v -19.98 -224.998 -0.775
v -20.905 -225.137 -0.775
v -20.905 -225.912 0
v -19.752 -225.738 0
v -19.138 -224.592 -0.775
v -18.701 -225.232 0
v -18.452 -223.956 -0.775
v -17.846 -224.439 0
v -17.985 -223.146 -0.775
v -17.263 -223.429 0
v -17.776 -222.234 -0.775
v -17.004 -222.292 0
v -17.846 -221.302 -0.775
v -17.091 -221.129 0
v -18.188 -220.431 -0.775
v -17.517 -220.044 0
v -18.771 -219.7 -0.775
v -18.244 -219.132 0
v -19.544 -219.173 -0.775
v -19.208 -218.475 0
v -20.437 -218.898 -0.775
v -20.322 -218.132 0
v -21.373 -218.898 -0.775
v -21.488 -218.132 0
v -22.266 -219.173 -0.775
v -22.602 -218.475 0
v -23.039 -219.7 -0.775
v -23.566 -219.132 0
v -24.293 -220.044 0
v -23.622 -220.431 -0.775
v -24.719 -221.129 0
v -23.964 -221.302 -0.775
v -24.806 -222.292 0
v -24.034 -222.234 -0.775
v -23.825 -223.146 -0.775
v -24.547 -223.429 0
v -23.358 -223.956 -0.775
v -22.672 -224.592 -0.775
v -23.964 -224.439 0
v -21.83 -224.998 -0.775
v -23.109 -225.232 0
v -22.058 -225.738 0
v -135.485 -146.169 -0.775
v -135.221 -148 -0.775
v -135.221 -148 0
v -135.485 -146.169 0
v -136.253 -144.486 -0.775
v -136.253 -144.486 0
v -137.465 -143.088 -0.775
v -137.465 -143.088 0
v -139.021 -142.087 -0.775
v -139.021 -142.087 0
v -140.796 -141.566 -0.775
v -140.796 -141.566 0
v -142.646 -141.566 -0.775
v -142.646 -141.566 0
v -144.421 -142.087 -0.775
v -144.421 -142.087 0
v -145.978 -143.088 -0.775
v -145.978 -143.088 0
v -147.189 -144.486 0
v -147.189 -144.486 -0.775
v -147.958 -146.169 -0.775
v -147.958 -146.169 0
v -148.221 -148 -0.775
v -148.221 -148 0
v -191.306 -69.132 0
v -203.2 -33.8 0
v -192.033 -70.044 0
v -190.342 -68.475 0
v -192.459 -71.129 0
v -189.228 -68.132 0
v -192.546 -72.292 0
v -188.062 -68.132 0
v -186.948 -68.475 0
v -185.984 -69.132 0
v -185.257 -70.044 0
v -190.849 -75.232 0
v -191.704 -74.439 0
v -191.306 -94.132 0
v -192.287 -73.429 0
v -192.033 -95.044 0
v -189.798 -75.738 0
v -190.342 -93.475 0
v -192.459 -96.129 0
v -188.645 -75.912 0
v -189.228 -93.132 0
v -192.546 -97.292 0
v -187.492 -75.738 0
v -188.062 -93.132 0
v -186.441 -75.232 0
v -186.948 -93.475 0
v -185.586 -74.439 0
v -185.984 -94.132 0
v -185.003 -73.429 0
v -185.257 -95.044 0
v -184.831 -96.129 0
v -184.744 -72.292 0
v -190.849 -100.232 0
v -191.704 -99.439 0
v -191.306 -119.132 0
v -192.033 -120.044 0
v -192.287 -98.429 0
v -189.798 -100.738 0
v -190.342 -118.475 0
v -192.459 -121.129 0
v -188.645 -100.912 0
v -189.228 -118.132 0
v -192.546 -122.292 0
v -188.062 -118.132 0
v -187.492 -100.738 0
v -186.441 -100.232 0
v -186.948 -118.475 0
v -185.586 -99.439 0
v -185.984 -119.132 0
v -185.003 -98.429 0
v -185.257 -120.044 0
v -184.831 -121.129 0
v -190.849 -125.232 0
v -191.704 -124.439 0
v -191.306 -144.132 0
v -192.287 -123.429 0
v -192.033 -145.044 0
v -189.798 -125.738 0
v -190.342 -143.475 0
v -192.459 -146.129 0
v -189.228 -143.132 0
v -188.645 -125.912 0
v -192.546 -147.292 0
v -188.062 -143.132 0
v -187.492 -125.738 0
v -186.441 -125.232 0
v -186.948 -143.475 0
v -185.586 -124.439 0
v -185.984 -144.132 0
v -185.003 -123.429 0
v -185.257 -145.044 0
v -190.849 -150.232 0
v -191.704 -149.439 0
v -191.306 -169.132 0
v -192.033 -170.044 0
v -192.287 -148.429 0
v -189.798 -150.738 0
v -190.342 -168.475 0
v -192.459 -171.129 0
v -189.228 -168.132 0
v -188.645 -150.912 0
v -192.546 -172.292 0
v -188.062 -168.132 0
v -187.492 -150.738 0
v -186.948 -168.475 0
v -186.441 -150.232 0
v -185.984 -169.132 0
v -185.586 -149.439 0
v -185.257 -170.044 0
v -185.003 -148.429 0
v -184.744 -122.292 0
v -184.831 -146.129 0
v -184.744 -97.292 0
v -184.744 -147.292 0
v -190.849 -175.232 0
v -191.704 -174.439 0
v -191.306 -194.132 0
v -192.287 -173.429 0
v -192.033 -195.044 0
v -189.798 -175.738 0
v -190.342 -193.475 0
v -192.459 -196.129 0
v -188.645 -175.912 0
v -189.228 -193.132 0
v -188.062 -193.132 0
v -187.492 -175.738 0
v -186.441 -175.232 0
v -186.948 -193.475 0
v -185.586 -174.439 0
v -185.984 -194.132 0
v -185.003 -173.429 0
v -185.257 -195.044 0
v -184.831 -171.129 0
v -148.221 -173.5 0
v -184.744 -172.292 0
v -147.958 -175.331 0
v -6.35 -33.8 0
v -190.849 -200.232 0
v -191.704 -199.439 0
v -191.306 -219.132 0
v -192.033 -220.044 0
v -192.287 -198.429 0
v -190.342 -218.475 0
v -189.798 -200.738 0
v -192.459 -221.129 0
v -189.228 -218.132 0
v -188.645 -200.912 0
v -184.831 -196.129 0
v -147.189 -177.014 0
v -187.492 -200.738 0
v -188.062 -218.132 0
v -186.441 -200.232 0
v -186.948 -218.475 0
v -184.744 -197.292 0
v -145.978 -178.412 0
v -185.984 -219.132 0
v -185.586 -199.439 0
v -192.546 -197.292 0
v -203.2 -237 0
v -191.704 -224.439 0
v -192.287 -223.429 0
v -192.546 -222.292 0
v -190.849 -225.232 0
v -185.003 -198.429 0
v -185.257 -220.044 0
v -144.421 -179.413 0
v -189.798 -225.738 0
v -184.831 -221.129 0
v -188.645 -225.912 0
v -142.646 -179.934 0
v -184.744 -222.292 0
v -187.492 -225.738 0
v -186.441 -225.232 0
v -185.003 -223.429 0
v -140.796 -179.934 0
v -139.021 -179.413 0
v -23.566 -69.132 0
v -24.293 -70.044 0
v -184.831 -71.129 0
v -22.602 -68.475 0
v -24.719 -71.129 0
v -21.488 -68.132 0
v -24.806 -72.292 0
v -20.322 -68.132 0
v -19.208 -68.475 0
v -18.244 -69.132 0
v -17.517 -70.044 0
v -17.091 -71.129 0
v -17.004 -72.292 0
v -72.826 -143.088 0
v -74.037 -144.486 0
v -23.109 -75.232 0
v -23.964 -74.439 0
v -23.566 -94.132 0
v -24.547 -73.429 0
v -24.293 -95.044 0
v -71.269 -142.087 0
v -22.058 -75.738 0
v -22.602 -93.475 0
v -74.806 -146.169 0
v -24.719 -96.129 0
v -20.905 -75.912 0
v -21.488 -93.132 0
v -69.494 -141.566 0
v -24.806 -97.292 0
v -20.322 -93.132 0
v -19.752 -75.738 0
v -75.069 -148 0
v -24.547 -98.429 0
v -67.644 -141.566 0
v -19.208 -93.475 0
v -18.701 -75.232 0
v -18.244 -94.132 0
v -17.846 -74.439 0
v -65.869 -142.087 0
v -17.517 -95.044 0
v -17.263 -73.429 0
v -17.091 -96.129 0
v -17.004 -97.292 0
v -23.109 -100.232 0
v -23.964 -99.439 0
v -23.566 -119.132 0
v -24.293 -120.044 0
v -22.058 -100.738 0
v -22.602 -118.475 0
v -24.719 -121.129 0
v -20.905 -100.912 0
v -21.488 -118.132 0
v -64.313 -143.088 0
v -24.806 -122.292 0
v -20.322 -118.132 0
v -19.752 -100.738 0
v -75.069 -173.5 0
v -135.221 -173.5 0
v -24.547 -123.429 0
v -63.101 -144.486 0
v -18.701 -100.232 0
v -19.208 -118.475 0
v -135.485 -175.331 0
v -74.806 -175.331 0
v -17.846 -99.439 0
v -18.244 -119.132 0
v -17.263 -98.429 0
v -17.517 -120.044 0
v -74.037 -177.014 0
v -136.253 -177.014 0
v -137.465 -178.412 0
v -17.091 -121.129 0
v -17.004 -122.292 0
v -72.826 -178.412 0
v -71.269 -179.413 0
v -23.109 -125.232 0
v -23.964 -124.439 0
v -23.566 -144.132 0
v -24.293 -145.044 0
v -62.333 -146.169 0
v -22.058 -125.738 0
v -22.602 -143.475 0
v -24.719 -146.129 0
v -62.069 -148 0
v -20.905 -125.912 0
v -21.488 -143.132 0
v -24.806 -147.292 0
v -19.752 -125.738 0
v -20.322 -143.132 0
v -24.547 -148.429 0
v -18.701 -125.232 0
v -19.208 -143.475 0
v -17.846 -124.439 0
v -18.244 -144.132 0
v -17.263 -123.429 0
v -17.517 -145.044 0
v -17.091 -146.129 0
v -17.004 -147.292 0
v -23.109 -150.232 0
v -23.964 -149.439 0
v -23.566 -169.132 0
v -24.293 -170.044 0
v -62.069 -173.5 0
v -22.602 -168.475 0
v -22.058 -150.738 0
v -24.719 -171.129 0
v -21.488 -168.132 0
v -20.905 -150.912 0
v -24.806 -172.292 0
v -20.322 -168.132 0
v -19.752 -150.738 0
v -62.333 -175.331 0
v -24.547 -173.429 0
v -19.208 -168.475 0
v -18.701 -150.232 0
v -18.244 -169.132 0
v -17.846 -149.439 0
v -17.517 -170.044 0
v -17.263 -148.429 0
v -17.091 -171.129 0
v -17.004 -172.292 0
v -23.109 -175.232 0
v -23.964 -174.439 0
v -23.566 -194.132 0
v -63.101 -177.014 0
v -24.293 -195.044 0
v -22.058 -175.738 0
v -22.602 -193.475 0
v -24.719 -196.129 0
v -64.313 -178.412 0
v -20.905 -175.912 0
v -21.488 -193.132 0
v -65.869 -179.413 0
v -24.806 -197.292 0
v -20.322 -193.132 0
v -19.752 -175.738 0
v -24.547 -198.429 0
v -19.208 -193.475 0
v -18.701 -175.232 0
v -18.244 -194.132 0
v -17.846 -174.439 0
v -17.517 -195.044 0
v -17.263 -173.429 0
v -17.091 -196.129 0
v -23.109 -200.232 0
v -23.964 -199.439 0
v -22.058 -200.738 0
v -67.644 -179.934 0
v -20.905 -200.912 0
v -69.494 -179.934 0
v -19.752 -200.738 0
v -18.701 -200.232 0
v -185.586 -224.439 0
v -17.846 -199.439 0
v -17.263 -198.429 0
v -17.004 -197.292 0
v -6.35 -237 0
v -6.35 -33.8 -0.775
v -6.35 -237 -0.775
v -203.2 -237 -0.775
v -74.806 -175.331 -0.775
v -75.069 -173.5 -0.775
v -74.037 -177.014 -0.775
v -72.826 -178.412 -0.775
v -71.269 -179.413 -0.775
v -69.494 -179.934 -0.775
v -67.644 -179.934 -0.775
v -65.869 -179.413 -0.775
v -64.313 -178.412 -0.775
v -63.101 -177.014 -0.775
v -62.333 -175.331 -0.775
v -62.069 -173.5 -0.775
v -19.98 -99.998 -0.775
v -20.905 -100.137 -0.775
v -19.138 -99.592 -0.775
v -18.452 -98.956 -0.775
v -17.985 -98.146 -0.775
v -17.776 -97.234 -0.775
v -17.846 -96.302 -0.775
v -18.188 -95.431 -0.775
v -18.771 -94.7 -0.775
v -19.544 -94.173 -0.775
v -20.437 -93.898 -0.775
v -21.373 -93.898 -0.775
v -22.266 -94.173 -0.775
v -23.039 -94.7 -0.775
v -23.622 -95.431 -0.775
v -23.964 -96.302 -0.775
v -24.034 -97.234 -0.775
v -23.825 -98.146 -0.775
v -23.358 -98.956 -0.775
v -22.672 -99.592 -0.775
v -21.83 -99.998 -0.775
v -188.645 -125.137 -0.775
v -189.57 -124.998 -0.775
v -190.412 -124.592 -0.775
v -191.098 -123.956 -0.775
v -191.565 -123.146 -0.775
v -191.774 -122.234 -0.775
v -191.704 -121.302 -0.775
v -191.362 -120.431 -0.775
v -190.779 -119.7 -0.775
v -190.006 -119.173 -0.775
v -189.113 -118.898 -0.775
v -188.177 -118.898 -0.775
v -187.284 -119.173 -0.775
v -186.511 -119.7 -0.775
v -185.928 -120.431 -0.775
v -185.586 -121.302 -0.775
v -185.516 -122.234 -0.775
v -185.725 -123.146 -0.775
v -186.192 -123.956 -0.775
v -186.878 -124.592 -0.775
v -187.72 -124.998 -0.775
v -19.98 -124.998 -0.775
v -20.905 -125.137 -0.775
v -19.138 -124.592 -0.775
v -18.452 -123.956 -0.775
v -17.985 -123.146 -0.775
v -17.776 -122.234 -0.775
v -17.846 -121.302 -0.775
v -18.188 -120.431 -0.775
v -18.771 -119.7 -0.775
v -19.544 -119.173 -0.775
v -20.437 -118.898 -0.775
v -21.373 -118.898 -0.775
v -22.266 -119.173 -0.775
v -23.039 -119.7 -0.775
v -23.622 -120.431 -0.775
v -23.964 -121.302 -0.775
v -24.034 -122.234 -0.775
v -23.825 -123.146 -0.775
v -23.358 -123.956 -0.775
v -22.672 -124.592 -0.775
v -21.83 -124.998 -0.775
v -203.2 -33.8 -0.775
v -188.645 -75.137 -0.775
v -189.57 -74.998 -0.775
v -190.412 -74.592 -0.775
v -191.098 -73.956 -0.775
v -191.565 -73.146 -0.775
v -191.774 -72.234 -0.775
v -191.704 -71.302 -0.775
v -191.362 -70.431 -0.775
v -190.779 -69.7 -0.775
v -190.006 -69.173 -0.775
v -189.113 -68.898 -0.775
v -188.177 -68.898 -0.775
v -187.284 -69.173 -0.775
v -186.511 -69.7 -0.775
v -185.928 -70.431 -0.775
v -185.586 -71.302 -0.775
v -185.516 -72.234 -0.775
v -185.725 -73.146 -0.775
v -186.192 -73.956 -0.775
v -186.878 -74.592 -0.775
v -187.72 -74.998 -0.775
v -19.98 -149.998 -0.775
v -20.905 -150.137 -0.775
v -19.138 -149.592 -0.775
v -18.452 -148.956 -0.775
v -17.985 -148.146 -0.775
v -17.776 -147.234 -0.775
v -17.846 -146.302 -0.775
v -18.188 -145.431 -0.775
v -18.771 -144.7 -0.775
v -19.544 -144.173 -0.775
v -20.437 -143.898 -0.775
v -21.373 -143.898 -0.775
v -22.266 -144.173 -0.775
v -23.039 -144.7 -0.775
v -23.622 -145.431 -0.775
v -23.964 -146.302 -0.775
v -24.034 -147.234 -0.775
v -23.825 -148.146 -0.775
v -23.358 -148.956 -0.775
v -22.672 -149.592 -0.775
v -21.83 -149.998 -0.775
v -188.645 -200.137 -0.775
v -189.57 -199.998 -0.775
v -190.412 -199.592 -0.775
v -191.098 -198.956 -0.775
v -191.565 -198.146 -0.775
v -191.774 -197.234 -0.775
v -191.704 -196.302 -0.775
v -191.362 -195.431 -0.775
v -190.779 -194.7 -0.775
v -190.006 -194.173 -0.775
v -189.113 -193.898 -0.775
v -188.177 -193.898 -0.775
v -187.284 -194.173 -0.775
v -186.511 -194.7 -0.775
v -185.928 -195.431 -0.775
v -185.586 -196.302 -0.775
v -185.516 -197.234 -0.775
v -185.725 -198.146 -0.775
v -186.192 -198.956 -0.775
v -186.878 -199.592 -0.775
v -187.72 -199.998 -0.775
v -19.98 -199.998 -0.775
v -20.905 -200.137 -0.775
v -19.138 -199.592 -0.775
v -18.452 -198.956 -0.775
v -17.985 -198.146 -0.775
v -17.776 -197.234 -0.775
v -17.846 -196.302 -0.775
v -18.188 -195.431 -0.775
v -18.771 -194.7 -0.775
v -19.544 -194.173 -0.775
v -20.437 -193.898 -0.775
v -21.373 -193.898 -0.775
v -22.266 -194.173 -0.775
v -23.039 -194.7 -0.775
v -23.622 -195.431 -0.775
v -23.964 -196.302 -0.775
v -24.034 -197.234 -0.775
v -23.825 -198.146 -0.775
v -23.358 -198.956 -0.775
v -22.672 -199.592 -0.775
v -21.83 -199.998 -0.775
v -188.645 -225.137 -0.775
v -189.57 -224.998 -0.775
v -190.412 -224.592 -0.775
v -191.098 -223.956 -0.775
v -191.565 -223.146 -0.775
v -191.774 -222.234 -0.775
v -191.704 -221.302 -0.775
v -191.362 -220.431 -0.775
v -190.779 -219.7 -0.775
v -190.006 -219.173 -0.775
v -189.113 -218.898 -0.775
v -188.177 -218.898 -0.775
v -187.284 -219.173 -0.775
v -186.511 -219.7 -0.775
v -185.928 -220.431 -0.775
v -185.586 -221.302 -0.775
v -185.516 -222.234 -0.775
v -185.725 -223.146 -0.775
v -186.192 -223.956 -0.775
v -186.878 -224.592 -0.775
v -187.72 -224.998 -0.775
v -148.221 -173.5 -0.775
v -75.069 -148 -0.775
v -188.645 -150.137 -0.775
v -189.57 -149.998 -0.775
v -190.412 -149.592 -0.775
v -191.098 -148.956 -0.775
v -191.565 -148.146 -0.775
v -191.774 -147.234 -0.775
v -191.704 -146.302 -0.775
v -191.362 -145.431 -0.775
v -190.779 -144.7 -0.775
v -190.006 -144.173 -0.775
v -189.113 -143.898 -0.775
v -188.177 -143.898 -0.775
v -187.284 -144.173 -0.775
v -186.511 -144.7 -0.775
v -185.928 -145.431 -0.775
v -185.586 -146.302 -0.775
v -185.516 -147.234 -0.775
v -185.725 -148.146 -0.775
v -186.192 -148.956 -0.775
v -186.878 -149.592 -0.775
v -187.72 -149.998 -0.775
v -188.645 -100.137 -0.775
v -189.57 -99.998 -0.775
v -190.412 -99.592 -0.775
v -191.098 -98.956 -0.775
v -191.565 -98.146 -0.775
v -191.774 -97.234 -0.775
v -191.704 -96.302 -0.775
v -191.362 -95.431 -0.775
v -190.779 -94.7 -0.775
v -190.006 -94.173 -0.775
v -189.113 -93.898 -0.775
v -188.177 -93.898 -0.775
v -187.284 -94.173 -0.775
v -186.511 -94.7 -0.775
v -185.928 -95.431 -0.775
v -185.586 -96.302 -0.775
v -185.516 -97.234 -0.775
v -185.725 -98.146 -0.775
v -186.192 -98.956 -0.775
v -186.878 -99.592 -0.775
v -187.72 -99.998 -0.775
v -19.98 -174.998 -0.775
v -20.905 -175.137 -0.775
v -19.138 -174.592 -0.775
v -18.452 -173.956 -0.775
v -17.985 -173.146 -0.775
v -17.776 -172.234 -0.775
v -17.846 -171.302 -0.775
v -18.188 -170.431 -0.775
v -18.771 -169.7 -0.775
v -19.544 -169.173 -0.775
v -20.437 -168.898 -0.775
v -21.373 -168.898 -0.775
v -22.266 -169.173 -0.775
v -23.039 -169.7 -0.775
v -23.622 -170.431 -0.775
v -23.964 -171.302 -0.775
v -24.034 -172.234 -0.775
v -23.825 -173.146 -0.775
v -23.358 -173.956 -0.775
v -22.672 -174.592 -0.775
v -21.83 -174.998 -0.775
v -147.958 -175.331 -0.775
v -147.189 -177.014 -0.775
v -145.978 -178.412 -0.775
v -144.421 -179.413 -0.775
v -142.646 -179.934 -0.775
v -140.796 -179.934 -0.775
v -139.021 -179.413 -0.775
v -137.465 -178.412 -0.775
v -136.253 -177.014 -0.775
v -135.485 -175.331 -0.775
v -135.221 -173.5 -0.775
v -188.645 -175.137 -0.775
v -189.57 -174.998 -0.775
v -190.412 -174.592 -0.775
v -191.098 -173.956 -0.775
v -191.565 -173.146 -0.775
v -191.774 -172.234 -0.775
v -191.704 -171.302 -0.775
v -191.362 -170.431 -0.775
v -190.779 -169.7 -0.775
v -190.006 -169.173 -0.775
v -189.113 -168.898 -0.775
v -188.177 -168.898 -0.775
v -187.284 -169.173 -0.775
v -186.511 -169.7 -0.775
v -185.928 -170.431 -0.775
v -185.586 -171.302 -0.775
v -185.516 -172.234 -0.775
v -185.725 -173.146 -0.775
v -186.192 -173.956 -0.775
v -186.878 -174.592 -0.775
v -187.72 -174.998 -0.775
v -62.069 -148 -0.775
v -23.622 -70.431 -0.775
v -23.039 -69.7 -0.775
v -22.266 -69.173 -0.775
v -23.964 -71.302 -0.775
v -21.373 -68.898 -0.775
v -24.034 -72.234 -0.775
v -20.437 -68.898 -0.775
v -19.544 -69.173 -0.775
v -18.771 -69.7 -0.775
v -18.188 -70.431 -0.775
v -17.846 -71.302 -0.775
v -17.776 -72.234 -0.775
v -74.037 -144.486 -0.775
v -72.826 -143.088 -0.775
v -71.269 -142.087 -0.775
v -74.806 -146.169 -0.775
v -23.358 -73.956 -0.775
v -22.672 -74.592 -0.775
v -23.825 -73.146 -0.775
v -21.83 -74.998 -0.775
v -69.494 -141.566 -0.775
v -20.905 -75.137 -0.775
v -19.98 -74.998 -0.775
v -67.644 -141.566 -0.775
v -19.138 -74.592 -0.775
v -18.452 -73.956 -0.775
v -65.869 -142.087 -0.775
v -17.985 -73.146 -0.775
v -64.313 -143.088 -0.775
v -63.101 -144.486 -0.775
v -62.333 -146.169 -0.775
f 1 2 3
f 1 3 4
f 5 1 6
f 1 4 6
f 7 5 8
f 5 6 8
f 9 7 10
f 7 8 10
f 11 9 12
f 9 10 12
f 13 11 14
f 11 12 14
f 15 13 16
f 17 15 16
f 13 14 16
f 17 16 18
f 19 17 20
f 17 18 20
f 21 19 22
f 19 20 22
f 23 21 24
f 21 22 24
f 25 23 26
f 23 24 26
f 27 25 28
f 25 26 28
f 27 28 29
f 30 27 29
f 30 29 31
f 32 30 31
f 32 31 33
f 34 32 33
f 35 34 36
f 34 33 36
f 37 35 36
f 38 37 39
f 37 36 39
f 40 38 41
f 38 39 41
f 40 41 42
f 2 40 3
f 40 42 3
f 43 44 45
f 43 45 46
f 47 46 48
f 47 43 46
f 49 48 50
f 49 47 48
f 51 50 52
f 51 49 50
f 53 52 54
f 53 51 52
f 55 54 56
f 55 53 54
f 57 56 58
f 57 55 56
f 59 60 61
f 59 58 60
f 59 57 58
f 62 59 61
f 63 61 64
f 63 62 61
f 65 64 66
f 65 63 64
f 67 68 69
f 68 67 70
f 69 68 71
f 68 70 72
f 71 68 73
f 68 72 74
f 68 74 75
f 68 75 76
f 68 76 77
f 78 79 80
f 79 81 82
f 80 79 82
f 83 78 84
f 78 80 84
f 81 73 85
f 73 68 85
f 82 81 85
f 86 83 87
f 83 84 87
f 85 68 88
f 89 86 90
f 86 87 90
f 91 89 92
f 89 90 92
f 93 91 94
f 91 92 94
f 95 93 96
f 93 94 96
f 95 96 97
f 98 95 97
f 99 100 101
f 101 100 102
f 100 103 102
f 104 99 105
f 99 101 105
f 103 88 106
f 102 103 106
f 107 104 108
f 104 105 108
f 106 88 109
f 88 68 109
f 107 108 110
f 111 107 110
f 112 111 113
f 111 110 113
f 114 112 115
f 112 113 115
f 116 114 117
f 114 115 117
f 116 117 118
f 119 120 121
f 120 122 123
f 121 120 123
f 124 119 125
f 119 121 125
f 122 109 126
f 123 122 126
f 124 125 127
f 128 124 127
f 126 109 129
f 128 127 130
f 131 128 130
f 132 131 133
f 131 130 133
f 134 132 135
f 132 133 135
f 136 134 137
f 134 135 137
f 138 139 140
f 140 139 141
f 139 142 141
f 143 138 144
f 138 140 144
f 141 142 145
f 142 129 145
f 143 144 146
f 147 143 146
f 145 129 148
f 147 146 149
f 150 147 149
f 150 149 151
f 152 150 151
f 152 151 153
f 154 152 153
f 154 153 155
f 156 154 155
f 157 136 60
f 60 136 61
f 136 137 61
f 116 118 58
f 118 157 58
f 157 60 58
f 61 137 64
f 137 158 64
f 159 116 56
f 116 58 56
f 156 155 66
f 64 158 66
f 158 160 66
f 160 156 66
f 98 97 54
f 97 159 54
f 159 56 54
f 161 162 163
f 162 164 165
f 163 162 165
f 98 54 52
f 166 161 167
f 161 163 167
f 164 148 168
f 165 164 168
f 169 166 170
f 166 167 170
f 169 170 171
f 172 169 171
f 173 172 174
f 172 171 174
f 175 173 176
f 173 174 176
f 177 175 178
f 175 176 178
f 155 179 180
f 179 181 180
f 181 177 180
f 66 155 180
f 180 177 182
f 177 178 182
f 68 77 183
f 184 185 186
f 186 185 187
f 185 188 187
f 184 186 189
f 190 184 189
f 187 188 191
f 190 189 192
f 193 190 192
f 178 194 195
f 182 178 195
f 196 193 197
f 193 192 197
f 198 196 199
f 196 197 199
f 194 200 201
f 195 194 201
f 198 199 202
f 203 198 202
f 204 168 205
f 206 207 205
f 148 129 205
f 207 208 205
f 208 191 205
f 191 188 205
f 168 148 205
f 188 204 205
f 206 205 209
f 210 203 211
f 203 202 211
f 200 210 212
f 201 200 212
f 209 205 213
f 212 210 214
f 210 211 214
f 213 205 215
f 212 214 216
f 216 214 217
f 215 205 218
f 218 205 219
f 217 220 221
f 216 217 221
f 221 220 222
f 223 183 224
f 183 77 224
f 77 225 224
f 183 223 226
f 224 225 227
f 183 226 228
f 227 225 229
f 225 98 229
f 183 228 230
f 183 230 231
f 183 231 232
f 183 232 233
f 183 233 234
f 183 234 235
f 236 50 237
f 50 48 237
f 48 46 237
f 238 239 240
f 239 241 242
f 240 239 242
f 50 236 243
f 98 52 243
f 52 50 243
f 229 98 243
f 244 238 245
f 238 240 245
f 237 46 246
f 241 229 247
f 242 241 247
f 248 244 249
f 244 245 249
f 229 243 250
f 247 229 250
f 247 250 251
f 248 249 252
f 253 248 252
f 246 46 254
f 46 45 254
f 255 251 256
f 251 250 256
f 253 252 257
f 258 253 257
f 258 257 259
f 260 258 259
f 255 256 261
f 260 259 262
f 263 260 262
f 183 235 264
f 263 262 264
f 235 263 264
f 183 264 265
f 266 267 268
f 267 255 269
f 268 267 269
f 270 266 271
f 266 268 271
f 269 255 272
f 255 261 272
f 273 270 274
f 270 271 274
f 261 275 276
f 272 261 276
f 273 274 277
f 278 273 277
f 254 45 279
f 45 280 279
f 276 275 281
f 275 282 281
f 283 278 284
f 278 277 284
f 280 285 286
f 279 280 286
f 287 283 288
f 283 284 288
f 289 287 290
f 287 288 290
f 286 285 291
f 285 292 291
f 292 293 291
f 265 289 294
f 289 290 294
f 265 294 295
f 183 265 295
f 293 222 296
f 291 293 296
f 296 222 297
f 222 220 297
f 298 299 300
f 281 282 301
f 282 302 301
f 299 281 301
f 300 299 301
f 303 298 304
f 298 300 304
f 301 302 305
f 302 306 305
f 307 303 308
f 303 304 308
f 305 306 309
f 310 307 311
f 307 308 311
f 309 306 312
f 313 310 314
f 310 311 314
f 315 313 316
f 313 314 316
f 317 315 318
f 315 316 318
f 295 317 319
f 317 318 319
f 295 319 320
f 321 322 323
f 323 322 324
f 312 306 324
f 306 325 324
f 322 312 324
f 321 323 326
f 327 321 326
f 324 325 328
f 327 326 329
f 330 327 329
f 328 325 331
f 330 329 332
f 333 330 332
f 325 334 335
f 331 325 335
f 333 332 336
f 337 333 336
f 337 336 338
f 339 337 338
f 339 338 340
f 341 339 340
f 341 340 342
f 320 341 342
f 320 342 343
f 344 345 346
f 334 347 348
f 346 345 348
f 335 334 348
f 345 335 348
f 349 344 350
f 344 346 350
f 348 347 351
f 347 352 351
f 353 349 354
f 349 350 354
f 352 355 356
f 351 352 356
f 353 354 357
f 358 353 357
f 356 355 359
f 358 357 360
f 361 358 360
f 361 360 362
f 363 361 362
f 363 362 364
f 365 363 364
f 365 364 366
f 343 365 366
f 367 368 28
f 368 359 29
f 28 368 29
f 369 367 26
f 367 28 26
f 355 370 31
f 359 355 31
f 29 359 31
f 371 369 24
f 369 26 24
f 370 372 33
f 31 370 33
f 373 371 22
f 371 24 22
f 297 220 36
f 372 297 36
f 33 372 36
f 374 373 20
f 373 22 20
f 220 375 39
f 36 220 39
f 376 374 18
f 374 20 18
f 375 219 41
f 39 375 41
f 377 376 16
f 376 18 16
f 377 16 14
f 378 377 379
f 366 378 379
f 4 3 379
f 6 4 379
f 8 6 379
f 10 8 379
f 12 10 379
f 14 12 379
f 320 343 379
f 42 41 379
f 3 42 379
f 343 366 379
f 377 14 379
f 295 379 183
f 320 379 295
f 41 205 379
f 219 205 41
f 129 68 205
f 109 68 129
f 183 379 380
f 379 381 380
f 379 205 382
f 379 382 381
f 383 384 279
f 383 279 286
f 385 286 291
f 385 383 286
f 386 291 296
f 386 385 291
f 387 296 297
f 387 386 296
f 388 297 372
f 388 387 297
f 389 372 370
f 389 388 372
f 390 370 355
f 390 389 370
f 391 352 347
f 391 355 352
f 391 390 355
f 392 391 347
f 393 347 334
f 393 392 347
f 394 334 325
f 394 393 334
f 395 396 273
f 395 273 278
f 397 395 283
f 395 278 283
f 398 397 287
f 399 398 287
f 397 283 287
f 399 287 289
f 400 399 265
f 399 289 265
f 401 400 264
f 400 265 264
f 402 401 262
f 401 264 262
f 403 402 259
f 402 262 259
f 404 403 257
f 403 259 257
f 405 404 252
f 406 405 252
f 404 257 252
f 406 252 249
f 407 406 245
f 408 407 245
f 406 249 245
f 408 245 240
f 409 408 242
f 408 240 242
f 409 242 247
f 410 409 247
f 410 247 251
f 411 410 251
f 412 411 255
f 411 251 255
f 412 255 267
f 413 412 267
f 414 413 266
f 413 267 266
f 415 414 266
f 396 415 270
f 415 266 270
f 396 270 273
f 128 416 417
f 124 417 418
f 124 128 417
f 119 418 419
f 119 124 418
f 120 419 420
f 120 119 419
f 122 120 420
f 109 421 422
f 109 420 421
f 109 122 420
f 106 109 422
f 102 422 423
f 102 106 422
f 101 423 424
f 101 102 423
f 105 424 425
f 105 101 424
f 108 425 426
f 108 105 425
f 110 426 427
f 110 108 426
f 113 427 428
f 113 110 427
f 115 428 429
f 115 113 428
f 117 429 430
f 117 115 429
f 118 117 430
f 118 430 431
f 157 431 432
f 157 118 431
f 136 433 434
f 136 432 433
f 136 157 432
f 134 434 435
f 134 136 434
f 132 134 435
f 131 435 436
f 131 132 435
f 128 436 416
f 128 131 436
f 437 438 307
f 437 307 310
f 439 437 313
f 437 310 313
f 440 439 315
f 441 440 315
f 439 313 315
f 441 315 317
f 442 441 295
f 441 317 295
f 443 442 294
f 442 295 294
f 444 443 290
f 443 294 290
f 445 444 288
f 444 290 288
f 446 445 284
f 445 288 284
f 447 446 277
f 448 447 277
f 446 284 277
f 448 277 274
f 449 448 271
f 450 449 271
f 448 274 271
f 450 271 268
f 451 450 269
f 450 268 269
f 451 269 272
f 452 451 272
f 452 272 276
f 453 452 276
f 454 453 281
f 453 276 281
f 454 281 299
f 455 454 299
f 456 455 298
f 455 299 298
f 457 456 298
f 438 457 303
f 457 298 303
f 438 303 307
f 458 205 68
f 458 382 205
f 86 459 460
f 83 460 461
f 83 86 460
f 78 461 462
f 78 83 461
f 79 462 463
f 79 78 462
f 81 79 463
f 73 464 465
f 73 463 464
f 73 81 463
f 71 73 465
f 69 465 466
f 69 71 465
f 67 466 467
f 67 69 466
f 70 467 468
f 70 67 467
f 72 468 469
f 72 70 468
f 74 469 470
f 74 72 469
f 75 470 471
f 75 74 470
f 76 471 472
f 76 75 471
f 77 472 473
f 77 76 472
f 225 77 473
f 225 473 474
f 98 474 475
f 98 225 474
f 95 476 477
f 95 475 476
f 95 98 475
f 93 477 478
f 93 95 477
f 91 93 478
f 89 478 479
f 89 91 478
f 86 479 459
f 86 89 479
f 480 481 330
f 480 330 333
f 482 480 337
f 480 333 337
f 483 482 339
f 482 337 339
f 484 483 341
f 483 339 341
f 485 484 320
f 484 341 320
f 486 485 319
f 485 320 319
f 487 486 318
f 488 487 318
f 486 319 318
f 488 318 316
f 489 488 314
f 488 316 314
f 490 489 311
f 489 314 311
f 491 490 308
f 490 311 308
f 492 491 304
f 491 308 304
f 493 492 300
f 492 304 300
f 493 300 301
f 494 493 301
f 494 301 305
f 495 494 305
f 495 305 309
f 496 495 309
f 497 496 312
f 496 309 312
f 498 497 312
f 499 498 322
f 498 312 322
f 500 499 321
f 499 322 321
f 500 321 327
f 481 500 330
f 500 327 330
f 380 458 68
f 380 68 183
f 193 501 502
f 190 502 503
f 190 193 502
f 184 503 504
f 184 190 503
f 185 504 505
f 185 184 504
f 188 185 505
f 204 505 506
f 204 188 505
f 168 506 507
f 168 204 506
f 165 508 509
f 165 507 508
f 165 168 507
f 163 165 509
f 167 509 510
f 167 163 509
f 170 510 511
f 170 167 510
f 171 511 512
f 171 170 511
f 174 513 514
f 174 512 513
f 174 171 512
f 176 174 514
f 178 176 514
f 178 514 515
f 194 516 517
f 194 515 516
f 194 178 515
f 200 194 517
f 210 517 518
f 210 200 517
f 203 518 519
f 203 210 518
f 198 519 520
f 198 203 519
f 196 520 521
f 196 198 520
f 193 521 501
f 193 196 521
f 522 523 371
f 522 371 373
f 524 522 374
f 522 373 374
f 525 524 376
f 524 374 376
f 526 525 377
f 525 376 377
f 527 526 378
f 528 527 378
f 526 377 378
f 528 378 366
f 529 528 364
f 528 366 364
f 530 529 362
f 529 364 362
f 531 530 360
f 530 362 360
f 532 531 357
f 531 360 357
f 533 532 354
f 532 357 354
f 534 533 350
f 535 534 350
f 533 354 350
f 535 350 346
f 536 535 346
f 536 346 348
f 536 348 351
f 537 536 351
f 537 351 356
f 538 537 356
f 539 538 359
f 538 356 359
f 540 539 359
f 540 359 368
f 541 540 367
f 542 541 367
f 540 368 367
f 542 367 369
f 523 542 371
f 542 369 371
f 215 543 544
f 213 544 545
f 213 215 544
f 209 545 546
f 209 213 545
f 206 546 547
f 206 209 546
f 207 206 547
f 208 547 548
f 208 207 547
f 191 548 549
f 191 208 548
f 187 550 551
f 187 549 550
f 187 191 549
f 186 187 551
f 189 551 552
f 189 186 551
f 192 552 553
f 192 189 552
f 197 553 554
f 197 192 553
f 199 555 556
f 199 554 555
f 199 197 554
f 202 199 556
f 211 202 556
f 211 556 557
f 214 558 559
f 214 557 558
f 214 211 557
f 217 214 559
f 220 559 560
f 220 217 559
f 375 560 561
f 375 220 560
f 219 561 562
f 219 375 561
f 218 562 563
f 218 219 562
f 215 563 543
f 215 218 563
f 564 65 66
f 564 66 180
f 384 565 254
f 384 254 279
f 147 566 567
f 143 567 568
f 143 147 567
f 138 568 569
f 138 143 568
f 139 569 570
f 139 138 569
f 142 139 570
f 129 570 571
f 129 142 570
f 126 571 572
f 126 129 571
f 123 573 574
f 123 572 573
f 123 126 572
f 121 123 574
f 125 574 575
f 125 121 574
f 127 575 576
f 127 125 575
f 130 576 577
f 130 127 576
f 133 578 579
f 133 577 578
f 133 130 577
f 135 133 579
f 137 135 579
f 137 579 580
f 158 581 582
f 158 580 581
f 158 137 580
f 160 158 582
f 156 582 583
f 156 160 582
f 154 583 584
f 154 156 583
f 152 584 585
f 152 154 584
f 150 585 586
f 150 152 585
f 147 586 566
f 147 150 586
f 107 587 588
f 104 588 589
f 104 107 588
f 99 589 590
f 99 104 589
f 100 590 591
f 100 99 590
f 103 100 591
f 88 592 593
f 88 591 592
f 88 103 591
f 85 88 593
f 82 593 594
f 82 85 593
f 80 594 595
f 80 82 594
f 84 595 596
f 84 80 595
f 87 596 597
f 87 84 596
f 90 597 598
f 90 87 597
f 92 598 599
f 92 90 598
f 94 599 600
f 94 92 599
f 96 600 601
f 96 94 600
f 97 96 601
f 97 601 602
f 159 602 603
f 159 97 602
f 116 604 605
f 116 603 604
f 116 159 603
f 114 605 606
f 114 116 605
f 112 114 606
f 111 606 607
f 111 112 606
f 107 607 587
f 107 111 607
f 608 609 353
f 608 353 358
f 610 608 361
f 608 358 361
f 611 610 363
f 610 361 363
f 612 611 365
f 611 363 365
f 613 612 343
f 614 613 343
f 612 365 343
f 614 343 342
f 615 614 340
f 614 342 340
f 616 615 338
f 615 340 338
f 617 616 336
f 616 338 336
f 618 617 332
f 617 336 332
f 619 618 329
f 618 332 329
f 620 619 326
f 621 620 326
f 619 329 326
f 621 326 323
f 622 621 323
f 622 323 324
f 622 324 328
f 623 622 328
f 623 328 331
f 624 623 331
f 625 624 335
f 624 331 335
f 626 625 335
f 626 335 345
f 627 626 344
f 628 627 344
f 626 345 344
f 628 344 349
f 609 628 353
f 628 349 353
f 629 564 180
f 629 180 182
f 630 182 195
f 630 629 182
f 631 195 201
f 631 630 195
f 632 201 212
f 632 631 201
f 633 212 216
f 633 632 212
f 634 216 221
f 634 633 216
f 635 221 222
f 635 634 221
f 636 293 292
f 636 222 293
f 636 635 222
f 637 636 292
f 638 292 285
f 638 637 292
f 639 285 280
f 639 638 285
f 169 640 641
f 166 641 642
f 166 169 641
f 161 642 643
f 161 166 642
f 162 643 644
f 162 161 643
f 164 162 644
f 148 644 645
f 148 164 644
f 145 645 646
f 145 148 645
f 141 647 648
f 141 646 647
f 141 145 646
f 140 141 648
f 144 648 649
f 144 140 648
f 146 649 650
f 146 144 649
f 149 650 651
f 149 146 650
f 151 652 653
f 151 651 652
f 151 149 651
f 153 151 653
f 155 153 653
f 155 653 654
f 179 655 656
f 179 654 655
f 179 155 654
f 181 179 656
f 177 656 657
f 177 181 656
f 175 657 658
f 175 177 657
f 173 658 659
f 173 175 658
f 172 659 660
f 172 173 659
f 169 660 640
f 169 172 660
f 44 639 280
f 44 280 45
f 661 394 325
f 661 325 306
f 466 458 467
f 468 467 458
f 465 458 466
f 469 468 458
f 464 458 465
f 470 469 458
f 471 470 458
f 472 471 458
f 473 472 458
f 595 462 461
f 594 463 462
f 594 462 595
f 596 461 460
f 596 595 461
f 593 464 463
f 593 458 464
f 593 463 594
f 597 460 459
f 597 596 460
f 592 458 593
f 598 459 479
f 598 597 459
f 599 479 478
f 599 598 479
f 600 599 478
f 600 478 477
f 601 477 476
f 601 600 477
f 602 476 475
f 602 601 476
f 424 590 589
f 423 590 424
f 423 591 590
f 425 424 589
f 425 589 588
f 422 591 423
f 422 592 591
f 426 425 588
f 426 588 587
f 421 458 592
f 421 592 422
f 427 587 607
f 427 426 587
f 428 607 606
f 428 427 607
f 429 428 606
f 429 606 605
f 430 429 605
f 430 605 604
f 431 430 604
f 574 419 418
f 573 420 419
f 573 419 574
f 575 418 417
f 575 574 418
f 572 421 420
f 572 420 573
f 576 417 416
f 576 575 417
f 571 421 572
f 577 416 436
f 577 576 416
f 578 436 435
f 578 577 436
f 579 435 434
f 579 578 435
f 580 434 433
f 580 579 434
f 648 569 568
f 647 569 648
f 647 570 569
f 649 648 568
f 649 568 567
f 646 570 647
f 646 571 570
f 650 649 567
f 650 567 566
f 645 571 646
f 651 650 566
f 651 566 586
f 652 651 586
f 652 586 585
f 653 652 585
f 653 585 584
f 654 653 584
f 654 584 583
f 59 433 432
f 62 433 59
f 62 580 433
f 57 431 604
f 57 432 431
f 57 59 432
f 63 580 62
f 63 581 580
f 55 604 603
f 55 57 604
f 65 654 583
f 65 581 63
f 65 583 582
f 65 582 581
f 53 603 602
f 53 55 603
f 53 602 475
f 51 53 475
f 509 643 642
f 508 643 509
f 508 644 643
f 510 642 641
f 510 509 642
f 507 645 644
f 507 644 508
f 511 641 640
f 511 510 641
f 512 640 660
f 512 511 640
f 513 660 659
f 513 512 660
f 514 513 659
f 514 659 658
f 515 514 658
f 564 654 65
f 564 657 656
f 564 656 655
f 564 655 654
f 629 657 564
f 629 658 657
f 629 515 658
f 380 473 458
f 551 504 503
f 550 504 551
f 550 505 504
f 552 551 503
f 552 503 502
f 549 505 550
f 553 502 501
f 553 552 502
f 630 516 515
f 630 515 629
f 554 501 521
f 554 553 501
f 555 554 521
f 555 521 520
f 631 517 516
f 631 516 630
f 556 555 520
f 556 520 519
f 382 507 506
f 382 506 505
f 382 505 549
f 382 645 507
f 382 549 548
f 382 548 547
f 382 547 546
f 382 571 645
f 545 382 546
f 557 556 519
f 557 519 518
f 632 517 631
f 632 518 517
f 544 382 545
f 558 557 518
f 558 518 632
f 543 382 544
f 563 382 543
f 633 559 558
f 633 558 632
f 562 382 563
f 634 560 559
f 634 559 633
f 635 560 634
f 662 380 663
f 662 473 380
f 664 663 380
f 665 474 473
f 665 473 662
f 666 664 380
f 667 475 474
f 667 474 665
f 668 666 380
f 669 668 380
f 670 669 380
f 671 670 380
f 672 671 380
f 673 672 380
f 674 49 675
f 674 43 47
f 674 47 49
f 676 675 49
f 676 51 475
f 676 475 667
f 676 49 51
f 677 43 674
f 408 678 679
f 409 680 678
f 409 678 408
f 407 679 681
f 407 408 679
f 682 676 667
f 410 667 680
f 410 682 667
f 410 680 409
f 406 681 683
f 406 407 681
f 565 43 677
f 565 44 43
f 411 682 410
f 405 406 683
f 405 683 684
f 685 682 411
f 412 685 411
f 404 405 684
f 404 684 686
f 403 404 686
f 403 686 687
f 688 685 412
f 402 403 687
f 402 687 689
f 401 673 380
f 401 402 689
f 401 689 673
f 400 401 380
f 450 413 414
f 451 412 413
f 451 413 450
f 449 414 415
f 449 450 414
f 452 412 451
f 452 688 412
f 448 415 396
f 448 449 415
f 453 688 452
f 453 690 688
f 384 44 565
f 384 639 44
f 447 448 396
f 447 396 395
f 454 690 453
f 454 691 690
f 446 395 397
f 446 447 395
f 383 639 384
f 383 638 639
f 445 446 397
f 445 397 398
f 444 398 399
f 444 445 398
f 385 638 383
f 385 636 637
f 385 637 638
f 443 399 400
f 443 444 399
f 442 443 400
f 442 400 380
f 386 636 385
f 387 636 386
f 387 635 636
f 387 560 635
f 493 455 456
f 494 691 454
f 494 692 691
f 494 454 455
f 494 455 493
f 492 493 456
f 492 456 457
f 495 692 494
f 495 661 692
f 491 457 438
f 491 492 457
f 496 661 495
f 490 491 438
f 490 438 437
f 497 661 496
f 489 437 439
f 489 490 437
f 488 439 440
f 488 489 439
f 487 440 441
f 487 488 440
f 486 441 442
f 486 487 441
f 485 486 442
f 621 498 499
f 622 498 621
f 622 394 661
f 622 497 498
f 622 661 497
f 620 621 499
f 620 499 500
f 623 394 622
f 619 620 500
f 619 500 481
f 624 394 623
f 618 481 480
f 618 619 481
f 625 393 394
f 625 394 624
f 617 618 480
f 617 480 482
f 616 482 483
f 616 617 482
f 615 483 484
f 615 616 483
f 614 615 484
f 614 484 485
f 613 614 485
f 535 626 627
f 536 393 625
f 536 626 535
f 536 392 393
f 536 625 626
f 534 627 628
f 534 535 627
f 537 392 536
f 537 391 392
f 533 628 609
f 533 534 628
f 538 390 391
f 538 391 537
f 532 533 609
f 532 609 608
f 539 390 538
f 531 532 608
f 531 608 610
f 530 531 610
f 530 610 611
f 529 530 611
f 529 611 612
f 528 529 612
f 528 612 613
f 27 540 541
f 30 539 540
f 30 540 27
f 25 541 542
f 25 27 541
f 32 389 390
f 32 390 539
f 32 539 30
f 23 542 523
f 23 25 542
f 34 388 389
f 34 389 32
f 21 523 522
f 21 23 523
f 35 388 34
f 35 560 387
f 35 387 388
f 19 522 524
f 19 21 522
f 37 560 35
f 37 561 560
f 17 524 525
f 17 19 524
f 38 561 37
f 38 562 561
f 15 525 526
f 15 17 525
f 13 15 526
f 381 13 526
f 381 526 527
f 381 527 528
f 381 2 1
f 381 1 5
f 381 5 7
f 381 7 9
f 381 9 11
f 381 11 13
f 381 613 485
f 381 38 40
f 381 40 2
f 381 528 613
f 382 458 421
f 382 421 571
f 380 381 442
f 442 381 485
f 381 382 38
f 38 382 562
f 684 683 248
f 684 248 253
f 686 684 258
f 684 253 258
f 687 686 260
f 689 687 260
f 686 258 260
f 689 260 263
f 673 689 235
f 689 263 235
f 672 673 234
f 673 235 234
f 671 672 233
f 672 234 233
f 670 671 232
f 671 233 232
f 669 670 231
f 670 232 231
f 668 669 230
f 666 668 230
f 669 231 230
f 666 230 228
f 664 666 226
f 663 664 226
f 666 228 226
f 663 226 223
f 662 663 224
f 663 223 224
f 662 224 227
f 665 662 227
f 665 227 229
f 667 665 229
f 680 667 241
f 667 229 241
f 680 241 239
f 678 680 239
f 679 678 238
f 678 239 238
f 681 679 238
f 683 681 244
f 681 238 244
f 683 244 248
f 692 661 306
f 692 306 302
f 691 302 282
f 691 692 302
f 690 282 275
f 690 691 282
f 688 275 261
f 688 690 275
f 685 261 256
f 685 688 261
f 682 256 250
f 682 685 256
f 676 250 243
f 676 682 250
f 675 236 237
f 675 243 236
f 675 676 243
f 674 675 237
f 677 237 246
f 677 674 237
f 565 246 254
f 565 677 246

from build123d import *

# Parameters (mm, degrees)
SKETCH1_W                                      = 196.85
SKETCH1_H                                      = 203.2
BOSS_EXTRUDE1_DEPTH                            = 0.7747
CUT_EXTRUDE7_DEPTH                             = 313.185586086
SKETCH4_W                                      = 196.85
SKETCH4_H                                      = 0.6096
BOSS_EXTRUDE2_DEPTH                            = 12
SKETCH14_W                                     = 196.85
SKETCH14_H                                     = 11.938
BOSS_EXTRUDE3_DEPTH                            = 0.7747
SKETCH13_W                                     = 196.85
SKETCH13_H                                     = 0.6096
CUT_EXTRUDE9_DEPTH                             = 12
CSK_FOR_M3_FLAT_HEAD_MACHINE_SCREW3_AT_2_COUNT = 2
CSK_FOR_M3_FLAT_HEAD_MACHINE_SCREW3_AT_2_PITCH = 150
CSK_FOR_M3_FLAT_HEAD_MACHINE_SCREW3_AT_3_COUNT = 2
CSK_FOR_M3_FLAT_HEAD_MACHINE_SCREW3_AT_3_PITCH = 125
CSK_FOR_M3_FLAT_HEAD_MACHINE_SCREW3_AT_4_COUNT = 2
CSK_FOR_M3_FLAT_HEAD_MACHINE_SCREW3_AT_4_PITCH = 100
CSK_FOR_M3_FLAT_HEAD_MACHINE_SCREW3_AT_5_COUNT = 2
CSK_FOR_M3_FLAT_HEAD_MACHINE_SCREW3_AT_5_PITCH = 75
CSK_FOR_M3_FLAT_HEAD_MACHINE_SCREW3_AT_6_COUNT = 2
CSK_FOR_M3_FLAT_HEAD_MACHINE_SCREW3_AT_6_PITCH = 50
CSK_FOR_M3_FLAT_HEAD_MACHINE_SCREW3_AT_7_COUNT = 2
CSK_FOR_M3_FLAT_HEAD_MACHINE_SCREW3_AT_7_PITCH = 25


with BuildPart() as part:
    # Sketch1 → Boss-Extrude1 (new body)
    with BuildSketch(Plane(origin=(0, 0, 0), x_dir=(1, 0, 0), z_dir=(0, 0, -1))):
        with Locations((-104.775, 135.4)):
            Rectangle(SKETCH1_W, SKETCH1_H)
    extrude(amount=BOSS_EXTRUDE1_DEPTH)

    # Sketch2 → Cut-Extrude7 (cut, through all)
    with BuildSketch(Plane(origin=(0, 0, -0.7747), x_dir=(1, 0, 0), z_dir=(0, 0, -1))):
        with BuildLine():
            Line((-135.221253236, 173.5), (-135.221253236, 148))
            ThreePointArc((-135.221253236, 148), (-141.721253236, 141.5), (-148.221253236, 148))
            Line((-148.221253236, 148), (-148.221253236, 173.5))
            ThreePointArc((-148.221253236, 173.5), (-141.721253236, 180), (-135.221253236, 173.5))
        make_face()
        with BuildLine():
            Line((-62.069253236, 173.5), (-62.069253236, 148))
            ThreePointArc((-62.069253236, 148), (-68.569253236, 141.5), (-75.069253236, 148))
            Line((-75.069253236, 148), (-75.069253236, 173.5))
            ThreePointArc((-75.069253236, 173.5), (-68.569253236, 180), (-62.069253236, 173.5))
        make_face()
    extrude(amount=-CUT_EXTRUDE7_DEPTH, mode=Mode.SUBTRACT)

    # Sketch4 → Boss-Extrude2 (add)
    with BuildSketch(Plane.XY):
        with Locations((-104.775, -34.1048)):
            Rectangle(SKETCH4_W, SKETCH4_H)
    extrude(amount=BOSS_EXTRUDE2_DEPTH)

    # Sketch14 → Boss-Extrude3 (add)
    with BuildSketch(Plane.XY):
        with Locations((-104.775, -53.935004147)):
            Rectangle(SKETCH14_W, SKETCH14_H)
    extrude(amount=-BOSS_EXTRUDE3_DEPTH)

    # Sketch13 → Cut-Extrude9 (cut)
    with BuildSketch(Plane.XY.offset(12)):
        with Locations((-104.775, -34.1048)):
            Rectangle(SKETCH13_W, SKETCH13_H)
    extrude(amount=-CUT_EXTRUDE9_DEPTH, mode=Mode.SUBTRACT)

    # Sketch16 → CSK for M3 Flat Head Machine Screw3 (revolve, cut)
    with BuildSketch(Plane(origin=(-188.645, -72, 0), x_dir=(0, -1, 0), z_dir=(1, 0, 0))):
        Polygon((0, 0), (0, 0.7747), (1.7, 0.7747), (1.7, 2.212), (3.912, 0), align=None)
    csk_for_m3_flat_head_machine_screw3 = revolve(axis=Axis((-188.645, -72, 6.35), (0, 0, -1)), mode=Mode.SUBTRACT)

    # CSK for M3 Flat Head Machine Screw3 at 2: CSK for M3 Flat Head Machine Screw3 ×2
    with Locations(*[(0, -i * CSK_FOR_M3_FLAT_HEAD_MACHINE_SCREW3_AT_2_PITCH, 0) for i in range(1, CSK_FOR_M3_FLAT_HEAD_MACHINE_SCREW3_AT_2_COUNT)]):
        add(csk_for_m3_flat_head_machine_screw3, mode=Mode.SUBTRACT)

    # CSK for M3 Flat Head Machine Screw3 at 3: CSK for M3 Flat Head Machine Screw3 ×2
    with Locations(*[(0, -i * CSK_FOR_M3_FLAT_HEAD_MACHINE_SCREW3_AT_3_PITCH, 0) for i in range(1, CSK_FOR_M3_FLAT_HEAD_MACHINE_SCREW3_AT_3_COUNT)]):
        add(csk_for_m3_flat_head_machine_screw3, mode=Mode.SUBTRACT)

    # CSK for M3 Flat Head Machine Screw3 at 4: CSK for M3 Flat Head Machine Screw3 ×2
    with Locations(*[(0, -i * CSK_FOR_M3_FLAT_HEAD_MACHINE_SCREW3_AT_4_PITCH, 0) for i in range(1, CSK_FOR_M3_FLAT_HEAD_MACHINE_SCREW3_AT_4_COUNT)]):
        add(csk_for_m3_flat_head_machine_screw3, mode=Mode.SUBTRACT)

    # CSK for M3 Flat Head Machine Screw3 at 5: CSK for M3 Flat Head Machine Screw3 ×2
    with Locations(*[(0, -i * CSK_FOR_M3_FLAT_HEAD_MACHINE_SCREW3_AT_5_PITCH, 0) for i in range(1, CSK_FOR_M3_FLAT_HEAD_MACHINE_SCREW3_AT_5_COUNT)]):
        add(csk_for_m3_flat_head_machine_screw3, mode=Mode.SUBTRACT)

    # CSK for M3 Flat Head Machine Screw3 at 6: CSK for M3 Flat Head Machine Screw3 ×2
    with Locations(*[(0, -i * CSK_FOR_M3_FLAT_HEAD_MACHINE_SCREW3_AT_6_PITCH, 0) for i in range(1, CSK_FOR_M3_FLAT_HEAD_MACHINE_SCREW3_AT_6_COUNT)]):
        add(csk_for_m3_flat_head_machine_screw3, mode=Mode.SUBTRACT)

    # CSK for M3 Flat Head Machine Screw3 at 7: CSK for M3 Flat Head Machine Screw3 ×2
    with Locations(*[(0, -i * CSK_FOR_M3_FLAT_HEAD_MACHINE_SCREW3_AT_7_PITCH, 0) for i in range(1, CSK_FOR_M3_FLAT_HEAD_MACHINE_SCREW3_AT_7_COUNT)]):
        add(csk_for_m3_flat_head_machine_screw3, mode=Mode.SUBTRACT)

    # Mirror1: CSK for M3 Flat Head Machine Screw3 across plane
    add(csk_for_m3_flat_head_machine_screw3.mirror(Plane.ZY.offset(104.774999995)), mode=Mode.SUBTRACT)

    # Mirror1 copy 1 sketch → Mirror1 copy 1 (revolve, cut)
    with BuildSketch(Plane(origin=(-20.904999999, -222.000000003, 0), x_dir=(-3.839898042745385e-11, -1.0, 0), z_dir=(-1.0, 3.839898042745385e-11, 0))):
        Polygon((0, 0), (0, -0.7747), (1.7, -0.7747), (1.7, -2.212), (3.912, 0), align=None)
    revolve(axis=Axis((-20.904999999, -222.000000003, 6.35), (0, 0, 1)), mode=Mode.SUBTRACT)

    # Mirror1 copy 2 sketch → Mirror1 copy 2 (revolve, cut)
    with BuildSketch(Plane(origin=(-20.904999998, -197.000000003, 0), x_dir=(-3.839898042745385e-11, -1.0, 0), z_dir=(-1.0, 3.839898042745385e-11, 0))):
        Polygon((0, 0), (0, -0.7747), (1.7, -0.7747), (1.7, -2.212), (3.912, 0), align=None)
    revolve(axis=Axis((-20.904999998, -197.000000003, 6.35), (0, 0, 1)), mode=Mode.SUBTRACT)

    # Mirror1 copy 3 sketch → Mirror1 copy 3 (revolve, cut)
    with BuildSketch(Plane(origin=(-20.904999998, -172.000000003, 0), x_dir=(-3.839898042745385e-11, -1.0, 0), z_dir=(-1.0, 3.839898042745385e-11, 0))):
        Polygon((0, 0), (0, -0.7747), (1.7, -0.7747), (1.7, -2.212), (3.912, 0), align=None)
    revolve(axis=Axis((-20.904999998, -172.000000003, 6.35), (0, 0, 1)), mode=Mode.SUBTRACT)

    # Mirror1 copy 4 sketch → Mirror1 copy 4 (revolve, cut)
    with BuildSketch(Plane(origin=(-20.904999997, -147.000000003, 0), x_dir=(-3.839898042745385e-11, -1.0, 0), z_dir=(-1.0, 3.839898042745385e-11, 0))):
        Polygon((0, 0), (0, -0.7747), (1.7, -0.7747), (1.7, -2.212), (3.912, 0), align=None)
    revolve(axis=Axis((-20.904999997, -147.000000003, 6.35), (0, 0, 1)), mode=Mode.SUBTRACT)

    # Mirror1 copy 5 sketch → Mirror1 copy 5 (revolve, cut)
    with BuildSketch(Plane(origin=(-20.904999996, -122.000000003, 0), x_dir=(-3.839898042745385e-11, -1.0, 0), z_dir=(-1.0, 3.839898042745385e-11, 0))):
        Polygon((0, 0), (0, -0.7747), (1.7, -0.7747), (1.7, -2.212), (3.912, 0), align=None)
    revolve(axis=Axis((-20.904999996, -122.000000003, 6.35), (0, 0, 1)), mode=Mode.SUBTRACT)

    # Mirror1 copy 6 sketch → Mirror1 copy 6 (revolve, cut)
    with BuildSketch(Plane(origin=(-20.904999995, -97.000000003, 0), x_dir=(-3.839898042745385e-11, -1.0, 0), z_dir=(-1.0, 3.839898042745385e-11, 0))):
        Polygon((0, 0), (0, -0.7747), (1.7, -0.7747), (1.7, -2.212), (3.912, 0), align=None)
    revolve(axis=Axis((-20.904999995, -97.000000003, 6.35), (0, 0, 1)), mode=Mode.SUBTRACT)


solid = part.part
